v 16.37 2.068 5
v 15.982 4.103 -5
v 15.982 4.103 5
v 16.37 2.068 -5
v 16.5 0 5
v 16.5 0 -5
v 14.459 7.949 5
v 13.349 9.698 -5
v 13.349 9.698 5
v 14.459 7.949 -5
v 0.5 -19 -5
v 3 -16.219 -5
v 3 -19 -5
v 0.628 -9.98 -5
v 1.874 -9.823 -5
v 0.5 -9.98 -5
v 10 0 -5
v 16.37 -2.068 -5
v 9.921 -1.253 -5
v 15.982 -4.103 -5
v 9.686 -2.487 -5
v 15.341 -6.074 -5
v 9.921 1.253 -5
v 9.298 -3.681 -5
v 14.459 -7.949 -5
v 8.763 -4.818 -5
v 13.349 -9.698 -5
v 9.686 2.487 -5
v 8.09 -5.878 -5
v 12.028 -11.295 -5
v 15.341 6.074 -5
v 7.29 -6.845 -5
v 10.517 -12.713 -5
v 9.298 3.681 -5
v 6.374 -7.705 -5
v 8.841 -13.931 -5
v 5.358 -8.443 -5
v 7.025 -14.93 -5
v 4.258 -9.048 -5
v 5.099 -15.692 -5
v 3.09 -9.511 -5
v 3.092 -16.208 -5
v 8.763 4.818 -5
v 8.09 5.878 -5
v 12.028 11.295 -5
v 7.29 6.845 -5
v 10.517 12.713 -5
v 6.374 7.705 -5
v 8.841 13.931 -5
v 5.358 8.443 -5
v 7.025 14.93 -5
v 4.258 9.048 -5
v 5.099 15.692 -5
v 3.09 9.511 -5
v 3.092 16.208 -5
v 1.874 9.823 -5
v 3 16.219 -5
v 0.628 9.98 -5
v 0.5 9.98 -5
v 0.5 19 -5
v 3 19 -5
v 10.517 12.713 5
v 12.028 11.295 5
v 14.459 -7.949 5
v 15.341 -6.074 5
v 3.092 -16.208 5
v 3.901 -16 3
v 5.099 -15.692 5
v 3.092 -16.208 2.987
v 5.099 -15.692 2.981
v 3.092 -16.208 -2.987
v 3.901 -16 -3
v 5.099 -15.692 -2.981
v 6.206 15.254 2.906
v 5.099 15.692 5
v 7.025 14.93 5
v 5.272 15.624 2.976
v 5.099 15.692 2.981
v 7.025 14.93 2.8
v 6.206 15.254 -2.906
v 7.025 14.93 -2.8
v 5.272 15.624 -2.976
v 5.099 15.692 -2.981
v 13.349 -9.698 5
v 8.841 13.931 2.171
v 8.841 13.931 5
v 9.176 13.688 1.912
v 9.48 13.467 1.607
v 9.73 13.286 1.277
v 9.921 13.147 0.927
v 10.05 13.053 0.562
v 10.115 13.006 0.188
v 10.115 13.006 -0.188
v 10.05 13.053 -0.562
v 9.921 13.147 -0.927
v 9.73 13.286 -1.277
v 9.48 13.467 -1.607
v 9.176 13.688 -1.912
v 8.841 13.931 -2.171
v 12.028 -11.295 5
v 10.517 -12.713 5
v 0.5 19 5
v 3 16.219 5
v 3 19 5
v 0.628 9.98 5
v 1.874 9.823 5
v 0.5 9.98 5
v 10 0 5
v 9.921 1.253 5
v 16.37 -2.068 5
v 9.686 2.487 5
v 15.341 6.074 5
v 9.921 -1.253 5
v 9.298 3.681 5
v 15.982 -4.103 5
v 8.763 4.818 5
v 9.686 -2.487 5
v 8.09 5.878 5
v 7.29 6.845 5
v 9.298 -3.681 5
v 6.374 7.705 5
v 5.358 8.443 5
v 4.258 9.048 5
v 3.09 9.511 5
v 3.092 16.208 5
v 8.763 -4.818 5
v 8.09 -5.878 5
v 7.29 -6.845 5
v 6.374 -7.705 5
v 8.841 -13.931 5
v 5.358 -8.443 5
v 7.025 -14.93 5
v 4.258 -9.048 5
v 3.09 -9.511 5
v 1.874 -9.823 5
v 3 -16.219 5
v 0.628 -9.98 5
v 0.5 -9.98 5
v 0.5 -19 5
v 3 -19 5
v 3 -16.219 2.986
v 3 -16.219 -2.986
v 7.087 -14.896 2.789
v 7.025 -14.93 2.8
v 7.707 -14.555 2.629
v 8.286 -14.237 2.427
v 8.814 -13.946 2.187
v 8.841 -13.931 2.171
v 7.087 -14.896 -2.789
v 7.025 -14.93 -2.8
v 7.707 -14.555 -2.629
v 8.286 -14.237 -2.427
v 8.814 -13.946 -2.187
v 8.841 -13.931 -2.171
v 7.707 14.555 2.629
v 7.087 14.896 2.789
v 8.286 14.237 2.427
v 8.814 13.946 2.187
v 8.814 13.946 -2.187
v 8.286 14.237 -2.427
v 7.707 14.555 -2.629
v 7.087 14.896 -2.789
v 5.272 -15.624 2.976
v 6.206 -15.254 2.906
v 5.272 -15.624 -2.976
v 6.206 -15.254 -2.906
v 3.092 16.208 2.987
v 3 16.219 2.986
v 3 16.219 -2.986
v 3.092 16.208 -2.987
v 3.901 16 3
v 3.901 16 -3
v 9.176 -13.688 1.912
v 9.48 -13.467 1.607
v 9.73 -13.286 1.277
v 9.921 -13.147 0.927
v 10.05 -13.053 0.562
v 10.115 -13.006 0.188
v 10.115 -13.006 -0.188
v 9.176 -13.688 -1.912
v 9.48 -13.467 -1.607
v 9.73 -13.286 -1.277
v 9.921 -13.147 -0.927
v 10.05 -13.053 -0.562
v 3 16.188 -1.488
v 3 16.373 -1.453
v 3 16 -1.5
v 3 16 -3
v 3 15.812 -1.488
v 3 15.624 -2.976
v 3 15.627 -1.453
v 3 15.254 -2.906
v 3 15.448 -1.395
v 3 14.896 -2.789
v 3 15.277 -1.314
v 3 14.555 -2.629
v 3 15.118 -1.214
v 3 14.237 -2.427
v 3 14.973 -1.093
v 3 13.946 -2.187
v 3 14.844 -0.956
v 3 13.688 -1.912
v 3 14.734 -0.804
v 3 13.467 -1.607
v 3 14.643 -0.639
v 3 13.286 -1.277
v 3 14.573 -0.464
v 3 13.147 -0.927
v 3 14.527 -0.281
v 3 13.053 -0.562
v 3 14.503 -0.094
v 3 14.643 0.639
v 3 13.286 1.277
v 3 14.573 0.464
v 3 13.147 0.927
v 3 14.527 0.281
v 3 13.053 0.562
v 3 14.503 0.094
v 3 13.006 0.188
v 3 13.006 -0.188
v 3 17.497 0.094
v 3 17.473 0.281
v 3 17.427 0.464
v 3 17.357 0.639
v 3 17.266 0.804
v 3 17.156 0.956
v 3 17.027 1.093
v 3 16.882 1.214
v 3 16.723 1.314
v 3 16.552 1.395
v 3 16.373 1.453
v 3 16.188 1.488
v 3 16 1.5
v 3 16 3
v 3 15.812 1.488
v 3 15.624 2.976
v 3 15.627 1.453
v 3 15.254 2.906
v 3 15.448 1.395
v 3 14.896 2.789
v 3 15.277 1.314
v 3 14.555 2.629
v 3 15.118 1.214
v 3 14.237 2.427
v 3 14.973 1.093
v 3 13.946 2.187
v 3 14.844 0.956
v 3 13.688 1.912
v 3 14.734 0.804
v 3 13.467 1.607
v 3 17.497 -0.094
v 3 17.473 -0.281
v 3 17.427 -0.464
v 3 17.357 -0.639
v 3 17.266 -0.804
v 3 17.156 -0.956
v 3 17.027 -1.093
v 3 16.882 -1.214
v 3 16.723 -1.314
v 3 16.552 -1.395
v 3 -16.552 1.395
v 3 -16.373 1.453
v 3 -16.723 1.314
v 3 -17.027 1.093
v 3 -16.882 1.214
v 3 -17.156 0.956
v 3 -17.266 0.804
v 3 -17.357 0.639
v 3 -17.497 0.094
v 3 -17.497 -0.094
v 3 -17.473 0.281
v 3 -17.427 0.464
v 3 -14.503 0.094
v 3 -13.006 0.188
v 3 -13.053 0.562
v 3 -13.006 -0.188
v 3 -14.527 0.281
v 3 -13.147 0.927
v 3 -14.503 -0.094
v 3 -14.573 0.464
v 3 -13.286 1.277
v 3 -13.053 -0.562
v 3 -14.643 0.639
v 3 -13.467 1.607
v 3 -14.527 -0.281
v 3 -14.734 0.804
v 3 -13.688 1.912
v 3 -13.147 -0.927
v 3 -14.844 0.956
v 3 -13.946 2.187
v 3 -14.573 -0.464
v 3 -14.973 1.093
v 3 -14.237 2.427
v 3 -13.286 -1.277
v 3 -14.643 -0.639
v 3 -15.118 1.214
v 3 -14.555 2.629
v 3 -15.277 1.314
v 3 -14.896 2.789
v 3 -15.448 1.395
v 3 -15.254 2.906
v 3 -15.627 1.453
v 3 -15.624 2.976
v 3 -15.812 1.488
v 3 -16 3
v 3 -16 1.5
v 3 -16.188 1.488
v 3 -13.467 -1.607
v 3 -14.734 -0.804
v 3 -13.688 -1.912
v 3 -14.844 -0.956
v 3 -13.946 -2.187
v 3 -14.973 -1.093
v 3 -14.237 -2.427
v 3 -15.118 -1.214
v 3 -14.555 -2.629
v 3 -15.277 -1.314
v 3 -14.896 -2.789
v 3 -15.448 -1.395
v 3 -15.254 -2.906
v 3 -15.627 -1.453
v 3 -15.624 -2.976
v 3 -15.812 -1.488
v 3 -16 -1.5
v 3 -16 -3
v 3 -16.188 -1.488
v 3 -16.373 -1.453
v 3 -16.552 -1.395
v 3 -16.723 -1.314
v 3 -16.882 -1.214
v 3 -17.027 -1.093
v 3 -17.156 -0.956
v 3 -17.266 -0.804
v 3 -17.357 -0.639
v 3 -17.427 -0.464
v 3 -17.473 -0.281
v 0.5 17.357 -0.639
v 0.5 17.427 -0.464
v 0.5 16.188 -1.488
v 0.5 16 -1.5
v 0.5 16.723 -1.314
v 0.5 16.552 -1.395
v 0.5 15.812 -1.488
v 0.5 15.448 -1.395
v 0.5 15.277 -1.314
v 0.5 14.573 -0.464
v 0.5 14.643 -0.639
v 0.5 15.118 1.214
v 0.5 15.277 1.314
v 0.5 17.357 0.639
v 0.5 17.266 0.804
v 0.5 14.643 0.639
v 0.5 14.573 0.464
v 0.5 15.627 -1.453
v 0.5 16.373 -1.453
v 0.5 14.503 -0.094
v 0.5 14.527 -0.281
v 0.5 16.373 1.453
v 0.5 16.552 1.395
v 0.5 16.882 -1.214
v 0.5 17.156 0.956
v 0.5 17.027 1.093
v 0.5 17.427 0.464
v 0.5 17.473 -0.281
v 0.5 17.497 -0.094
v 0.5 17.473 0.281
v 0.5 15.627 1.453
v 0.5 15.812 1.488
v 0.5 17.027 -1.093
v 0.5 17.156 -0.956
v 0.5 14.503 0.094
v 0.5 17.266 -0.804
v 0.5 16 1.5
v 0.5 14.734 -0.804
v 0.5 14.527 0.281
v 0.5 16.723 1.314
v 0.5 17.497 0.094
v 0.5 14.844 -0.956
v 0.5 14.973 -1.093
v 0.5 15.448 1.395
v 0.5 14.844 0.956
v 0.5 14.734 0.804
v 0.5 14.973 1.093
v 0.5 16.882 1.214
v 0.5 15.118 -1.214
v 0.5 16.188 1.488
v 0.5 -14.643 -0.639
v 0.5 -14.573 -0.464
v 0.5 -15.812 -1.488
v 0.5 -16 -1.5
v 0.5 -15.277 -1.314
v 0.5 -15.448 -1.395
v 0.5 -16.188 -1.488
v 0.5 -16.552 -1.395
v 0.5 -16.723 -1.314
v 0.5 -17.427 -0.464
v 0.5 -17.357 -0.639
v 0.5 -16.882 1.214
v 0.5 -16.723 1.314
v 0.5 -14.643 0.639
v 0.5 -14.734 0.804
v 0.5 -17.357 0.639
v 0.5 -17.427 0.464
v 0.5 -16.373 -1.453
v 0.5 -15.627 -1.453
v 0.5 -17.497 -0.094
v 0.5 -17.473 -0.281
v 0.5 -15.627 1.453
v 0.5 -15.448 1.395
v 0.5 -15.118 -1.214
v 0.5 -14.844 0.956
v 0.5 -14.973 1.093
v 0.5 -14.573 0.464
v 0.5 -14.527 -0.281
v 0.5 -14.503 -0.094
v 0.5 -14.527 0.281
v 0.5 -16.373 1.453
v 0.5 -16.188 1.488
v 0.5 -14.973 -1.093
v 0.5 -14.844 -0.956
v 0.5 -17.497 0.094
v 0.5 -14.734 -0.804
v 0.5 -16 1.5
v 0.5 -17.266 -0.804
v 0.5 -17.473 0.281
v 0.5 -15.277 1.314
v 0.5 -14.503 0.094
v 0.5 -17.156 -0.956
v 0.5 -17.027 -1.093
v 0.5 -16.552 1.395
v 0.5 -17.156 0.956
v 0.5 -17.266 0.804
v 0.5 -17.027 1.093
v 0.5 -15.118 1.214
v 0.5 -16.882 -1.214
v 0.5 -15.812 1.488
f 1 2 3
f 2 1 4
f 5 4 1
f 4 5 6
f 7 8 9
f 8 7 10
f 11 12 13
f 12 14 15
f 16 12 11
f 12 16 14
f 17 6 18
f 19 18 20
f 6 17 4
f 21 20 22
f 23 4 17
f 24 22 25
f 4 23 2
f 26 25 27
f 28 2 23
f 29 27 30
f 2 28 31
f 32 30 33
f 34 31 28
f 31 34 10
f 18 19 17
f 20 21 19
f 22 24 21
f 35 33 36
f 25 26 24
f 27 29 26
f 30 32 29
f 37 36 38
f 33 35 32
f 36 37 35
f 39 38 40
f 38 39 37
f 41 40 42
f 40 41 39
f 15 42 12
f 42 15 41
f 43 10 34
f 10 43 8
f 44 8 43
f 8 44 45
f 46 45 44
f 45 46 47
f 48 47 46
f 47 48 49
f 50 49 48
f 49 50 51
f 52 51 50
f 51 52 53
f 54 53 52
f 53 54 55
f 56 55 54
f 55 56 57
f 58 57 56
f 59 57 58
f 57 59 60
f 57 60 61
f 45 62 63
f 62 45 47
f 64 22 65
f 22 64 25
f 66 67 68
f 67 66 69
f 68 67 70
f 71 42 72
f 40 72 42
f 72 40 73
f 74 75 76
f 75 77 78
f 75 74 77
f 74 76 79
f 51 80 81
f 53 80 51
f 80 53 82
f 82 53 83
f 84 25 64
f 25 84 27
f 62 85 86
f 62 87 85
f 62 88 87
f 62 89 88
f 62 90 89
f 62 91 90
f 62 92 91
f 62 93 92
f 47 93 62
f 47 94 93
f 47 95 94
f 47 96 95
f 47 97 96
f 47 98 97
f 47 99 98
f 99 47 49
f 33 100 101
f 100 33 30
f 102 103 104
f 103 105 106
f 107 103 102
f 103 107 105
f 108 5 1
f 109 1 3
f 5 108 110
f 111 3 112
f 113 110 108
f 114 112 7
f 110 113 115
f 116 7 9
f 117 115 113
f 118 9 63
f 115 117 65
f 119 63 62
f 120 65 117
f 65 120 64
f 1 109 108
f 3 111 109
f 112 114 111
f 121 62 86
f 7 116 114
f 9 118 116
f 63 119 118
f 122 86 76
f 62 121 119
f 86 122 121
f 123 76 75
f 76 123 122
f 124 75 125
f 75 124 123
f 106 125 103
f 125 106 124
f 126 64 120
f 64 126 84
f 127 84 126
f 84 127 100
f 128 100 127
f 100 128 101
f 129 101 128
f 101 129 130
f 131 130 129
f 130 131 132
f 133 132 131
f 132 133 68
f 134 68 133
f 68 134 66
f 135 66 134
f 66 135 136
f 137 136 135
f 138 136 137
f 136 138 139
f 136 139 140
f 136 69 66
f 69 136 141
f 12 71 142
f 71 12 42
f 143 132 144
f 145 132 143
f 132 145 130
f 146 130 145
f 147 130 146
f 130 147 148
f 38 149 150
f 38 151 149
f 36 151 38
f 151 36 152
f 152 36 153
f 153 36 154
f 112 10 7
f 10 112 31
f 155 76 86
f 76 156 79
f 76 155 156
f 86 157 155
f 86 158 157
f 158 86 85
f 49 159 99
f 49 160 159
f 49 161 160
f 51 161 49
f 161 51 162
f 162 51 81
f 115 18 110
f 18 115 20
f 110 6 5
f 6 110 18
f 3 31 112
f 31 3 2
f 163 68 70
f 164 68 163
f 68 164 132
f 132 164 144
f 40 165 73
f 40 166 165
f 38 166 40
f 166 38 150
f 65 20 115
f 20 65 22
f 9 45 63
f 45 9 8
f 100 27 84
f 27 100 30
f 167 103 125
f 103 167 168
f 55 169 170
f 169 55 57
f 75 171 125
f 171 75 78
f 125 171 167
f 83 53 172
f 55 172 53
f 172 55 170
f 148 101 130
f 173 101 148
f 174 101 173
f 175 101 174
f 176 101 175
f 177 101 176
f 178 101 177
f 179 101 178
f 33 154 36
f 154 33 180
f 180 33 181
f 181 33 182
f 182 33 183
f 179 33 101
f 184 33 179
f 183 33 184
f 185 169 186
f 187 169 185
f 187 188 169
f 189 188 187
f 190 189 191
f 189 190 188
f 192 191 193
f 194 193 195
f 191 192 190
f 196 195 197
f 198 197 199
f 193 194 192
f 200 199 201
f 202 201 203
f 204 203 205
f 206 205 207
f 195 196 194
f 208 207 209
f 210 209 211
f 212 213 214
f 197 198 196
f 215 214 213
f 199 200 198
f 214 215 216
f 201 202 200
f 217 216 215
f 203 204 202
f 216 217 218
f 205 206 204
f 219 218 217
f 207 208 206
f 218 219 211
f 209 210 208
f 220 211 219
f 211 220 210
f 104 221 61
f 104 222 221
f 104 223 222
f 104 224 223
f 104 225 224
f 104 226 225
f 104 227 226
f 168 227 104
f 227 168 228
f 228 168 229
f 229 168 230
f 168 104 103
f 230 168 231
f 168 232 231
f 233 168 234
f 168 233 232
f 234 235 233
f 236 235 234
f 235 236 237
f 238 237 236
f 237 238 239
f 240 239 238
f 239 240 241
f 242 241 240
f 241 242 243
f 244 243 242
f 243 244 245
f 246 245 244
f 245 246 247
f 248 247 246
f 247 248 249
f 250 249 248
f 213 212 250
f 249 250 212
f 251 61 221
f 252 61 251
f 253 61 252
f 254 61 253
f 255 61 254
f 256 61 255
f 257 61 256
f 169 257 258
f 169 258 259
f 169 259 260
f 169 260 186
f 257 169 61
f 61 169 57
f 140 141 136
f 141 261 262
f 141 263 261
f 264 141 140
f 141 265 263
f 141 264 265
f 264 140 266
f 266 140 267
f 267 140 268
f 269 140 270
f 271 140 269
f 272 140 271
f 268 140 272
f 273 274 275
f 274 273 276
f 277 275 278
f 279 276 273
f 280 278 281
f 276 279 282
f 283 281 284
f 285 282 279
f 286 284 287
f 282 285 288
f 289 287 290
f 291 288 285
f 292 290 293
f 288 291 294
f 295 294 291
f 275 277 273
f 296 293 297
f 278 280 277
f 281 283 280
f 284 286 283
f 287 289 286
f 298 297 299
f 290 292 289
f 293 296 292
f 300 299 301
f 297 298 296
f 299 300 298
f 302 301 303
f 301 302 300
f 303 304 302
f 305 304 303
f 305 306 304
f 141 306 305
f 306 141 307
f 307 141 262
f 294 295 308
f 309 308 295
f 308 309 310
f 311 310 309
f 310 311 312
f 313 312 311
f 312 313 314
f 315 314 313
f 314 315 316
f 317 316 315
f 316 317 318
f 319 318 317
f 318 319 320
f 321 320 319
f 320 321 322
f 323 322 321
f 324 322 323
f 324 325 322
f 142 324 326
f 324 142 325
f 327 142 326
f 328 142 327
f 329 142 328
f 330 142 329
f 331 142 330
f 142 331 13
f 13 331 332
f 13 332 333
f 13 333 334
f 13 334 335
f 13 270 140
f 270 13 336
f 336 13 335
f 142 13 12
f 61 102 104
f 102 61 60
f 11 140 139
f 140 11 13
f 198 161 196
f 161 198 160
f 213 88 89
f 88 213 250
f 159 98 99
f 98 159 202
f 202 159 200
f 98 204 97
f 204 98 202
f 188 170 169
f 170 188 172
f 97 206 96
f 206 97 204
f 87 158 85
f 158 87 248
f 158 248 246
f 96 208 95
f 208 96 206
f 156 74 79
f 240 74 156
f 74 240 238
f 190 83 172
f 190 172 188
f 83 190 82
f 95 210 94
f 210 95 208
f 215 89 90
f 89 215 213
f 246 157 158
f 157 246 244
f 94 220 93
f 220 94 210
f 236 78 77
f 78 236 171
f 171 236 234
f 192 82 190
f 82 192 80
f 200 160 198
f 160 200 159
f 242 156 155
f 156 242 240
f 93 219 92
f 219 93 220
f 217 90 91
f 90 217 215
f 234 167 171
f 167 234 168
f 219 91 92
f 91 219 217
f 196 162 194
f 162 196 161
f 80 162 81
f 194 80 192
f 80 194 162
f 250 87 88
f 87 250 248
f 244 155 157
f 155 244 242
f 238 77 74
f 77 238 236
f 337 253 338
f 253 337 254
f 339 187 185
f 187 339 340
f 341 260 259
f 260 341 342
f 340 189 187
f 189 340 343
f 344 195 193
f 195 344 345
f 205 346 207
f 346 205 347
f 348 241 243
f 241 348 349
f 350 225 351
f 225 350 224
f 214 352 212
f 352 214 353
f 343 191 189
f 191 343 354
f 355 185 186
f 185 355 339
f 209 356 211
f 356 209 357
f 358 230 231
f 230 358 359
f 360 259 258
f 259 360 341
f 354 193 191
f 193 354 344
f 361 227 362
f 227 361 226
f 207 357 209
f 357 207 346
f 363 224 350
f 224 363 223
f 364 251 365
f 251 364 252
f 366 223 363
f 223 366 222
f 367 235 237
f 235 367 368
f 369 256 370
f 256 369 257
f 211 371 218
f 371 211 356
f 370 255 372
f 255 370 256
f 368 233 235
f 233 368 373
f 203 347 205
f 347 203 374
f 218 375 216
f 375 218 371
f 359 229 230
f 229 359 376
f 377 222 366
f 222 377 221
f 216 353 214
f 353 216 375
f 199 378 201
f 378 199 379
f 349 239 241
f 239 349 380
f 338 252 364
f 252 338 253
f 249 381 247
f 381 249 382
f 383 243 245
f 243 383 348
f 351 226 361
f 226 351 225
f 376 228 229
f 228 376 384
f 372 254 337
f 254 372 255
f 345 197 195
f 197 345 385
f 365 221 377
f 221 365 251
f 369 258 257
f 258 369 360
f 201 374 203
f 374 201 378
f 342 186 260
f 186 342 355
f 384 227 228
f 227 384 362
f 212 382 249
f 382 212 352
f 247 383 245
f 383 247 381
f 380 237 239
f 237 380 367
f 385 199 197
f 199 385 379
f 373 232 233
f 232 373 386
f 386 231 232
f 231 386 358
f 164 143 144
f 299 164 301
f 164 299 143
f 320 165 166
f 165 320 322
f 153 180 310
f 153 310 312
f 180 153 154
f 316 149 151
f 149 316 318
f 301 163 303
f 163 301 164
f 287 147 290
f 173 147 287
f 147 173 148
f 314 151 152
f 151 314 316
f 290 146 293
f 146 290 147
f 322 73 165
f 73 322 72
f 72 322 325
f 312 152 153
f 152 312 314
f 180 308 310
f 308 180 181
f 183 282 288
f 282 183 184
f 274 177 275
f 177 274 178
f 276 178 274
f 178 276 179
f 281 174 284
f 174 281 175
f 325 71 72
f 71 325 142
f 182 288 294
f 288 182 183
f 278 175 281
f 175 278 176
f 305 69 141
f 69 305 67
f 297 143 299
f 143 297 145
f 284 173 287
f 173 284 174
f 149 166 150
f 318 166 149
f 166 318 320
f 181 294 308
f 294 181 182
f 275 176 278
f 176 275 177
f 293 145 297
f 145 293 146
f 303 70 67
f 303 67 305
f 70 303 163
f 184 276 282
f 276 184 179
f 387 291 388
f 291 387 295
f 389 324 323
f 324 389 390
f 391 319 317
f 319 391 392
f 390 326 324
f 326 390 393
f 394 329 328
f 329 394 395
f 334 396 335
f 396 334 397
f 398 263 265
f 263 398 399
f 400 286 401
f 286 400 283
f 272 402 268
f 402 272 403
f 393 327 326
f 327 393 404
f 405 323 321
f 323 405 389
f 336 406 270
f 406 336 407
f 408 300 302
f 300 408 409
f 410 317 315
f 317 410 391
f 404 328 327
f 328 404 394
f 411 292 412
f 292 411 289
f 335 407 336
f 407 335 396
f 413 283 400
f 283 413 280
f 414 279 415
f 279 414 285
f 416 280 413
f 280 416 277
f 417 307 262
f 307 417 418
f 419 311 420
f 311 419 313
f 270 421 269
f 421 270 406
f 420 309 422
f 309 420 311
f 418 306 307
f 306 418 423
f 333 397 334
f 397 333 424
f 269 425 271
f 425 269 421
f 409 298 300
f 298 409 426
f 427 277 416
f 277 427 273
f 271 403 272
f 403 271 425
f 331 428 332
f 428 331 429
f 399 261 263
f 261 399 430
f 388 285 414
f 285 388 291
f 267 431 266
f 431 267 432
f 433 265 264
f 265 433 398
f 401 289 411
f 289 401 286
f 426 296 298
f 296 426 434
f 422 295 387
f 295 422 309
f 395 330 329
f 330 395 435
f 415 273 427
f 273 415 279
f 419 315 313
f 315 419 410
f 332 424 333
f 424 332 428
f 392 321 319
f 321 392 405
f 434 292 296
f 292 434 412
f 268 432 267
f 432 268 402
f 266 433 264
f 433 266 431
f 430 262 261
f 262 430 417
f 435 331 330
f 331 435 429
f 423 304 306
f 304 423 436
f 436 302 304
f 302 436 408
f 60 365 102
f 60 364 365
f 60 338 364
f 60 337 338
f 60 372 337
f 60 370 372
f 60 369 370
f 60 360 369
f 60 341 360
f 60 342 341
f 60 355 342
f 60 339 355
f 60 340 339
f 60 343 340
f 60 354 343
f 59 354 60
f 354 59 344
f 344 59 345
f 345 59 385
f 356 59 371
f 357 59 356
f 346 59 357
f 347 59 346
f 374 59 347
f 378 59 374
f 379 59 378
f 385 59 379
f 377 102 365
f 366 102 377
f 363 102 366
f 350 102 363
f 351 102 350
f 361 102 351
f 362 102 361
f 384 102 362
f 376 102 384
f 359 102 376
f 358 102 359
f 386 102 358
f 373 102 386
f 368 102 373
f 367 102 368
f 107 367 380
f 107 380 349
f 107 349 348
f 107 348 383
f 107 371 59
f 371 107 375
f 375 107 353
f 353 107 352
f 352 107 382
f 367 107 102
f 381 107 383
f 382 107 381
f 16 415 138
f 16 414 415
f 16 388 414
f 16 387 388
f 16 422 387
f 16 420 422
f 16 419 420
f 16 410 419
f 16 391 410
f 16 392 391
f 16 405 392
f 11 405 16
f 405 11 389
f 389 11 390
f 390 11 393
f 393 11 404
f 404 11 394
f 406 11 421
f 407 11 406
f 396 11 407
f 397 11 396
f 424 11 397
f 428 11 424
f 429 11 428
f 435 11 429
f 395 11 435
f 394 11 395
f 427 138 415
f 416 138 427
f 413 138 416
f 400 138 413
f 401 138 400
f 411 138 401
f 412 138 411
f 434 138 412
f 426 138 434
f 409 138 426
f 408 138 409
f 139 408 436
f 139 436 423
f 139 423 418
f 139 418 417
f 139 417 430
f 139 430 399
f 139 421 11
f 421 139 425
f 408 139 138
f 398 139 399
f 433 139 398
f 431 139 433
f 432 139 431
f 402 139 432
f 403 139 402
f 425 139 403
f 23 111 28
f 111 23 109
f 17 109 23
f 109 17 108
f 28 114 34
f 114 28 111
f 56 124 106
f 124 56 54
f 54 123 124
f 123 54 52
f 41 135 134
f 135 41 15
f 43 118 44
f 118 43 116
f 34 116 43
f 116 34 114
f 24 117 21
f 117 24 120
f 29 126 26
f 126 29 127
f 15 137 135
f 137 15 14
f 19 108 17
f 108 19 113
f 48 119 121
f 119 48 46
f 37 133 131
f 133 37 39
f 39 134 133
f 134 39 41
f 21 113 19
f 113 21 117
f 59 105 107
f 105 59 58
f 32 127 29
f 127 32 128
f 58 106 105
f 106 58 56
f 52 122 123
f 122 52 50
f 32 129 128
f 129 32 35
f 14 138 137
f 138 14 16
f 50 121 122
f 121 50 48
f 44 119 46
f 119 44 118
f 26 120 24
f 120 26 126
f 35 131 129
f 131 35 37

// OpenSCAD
$fn=50;

longueur = 10;

diametre_int = 20;
diametre_ext = 33;
ecartement_vis = 16;

epaisseur_double_plaque = 6;

vis_diam_tete = 6;
vis_diam_corps= 3;
module main() {
    difference() {
        union() {
            cylinder(d=diametre_ext, h=longueur, center=true);
            cube([epaisseur_double_plaque,38,longueur], center=true);
        }
        cube([1,50,longueur+0.1], center=true);
        cylinder(d=diametre_int, h=longueur+0.1, center=true);
        translate([0, ecartement_vis,0])vis();
        translate([0,-ecartement_vis,0])vis();
    }
}

module vis() {
    rotate([0,90,0])cylinder(d=vis_diam_corps, center=true, h=30);
    difference() {
        rotate([0,90,0])cylinder(d=vis_diam_tete,     center=true, h=30);
        rotate([0,90,0])cylinder(d=vis_diam_tete+0.1, center=true, h=epaisseur_double_plaque);
    }
}

intersection() {
    main();
    translate([100,0,0])cube([200,200,200], center=true);
}
